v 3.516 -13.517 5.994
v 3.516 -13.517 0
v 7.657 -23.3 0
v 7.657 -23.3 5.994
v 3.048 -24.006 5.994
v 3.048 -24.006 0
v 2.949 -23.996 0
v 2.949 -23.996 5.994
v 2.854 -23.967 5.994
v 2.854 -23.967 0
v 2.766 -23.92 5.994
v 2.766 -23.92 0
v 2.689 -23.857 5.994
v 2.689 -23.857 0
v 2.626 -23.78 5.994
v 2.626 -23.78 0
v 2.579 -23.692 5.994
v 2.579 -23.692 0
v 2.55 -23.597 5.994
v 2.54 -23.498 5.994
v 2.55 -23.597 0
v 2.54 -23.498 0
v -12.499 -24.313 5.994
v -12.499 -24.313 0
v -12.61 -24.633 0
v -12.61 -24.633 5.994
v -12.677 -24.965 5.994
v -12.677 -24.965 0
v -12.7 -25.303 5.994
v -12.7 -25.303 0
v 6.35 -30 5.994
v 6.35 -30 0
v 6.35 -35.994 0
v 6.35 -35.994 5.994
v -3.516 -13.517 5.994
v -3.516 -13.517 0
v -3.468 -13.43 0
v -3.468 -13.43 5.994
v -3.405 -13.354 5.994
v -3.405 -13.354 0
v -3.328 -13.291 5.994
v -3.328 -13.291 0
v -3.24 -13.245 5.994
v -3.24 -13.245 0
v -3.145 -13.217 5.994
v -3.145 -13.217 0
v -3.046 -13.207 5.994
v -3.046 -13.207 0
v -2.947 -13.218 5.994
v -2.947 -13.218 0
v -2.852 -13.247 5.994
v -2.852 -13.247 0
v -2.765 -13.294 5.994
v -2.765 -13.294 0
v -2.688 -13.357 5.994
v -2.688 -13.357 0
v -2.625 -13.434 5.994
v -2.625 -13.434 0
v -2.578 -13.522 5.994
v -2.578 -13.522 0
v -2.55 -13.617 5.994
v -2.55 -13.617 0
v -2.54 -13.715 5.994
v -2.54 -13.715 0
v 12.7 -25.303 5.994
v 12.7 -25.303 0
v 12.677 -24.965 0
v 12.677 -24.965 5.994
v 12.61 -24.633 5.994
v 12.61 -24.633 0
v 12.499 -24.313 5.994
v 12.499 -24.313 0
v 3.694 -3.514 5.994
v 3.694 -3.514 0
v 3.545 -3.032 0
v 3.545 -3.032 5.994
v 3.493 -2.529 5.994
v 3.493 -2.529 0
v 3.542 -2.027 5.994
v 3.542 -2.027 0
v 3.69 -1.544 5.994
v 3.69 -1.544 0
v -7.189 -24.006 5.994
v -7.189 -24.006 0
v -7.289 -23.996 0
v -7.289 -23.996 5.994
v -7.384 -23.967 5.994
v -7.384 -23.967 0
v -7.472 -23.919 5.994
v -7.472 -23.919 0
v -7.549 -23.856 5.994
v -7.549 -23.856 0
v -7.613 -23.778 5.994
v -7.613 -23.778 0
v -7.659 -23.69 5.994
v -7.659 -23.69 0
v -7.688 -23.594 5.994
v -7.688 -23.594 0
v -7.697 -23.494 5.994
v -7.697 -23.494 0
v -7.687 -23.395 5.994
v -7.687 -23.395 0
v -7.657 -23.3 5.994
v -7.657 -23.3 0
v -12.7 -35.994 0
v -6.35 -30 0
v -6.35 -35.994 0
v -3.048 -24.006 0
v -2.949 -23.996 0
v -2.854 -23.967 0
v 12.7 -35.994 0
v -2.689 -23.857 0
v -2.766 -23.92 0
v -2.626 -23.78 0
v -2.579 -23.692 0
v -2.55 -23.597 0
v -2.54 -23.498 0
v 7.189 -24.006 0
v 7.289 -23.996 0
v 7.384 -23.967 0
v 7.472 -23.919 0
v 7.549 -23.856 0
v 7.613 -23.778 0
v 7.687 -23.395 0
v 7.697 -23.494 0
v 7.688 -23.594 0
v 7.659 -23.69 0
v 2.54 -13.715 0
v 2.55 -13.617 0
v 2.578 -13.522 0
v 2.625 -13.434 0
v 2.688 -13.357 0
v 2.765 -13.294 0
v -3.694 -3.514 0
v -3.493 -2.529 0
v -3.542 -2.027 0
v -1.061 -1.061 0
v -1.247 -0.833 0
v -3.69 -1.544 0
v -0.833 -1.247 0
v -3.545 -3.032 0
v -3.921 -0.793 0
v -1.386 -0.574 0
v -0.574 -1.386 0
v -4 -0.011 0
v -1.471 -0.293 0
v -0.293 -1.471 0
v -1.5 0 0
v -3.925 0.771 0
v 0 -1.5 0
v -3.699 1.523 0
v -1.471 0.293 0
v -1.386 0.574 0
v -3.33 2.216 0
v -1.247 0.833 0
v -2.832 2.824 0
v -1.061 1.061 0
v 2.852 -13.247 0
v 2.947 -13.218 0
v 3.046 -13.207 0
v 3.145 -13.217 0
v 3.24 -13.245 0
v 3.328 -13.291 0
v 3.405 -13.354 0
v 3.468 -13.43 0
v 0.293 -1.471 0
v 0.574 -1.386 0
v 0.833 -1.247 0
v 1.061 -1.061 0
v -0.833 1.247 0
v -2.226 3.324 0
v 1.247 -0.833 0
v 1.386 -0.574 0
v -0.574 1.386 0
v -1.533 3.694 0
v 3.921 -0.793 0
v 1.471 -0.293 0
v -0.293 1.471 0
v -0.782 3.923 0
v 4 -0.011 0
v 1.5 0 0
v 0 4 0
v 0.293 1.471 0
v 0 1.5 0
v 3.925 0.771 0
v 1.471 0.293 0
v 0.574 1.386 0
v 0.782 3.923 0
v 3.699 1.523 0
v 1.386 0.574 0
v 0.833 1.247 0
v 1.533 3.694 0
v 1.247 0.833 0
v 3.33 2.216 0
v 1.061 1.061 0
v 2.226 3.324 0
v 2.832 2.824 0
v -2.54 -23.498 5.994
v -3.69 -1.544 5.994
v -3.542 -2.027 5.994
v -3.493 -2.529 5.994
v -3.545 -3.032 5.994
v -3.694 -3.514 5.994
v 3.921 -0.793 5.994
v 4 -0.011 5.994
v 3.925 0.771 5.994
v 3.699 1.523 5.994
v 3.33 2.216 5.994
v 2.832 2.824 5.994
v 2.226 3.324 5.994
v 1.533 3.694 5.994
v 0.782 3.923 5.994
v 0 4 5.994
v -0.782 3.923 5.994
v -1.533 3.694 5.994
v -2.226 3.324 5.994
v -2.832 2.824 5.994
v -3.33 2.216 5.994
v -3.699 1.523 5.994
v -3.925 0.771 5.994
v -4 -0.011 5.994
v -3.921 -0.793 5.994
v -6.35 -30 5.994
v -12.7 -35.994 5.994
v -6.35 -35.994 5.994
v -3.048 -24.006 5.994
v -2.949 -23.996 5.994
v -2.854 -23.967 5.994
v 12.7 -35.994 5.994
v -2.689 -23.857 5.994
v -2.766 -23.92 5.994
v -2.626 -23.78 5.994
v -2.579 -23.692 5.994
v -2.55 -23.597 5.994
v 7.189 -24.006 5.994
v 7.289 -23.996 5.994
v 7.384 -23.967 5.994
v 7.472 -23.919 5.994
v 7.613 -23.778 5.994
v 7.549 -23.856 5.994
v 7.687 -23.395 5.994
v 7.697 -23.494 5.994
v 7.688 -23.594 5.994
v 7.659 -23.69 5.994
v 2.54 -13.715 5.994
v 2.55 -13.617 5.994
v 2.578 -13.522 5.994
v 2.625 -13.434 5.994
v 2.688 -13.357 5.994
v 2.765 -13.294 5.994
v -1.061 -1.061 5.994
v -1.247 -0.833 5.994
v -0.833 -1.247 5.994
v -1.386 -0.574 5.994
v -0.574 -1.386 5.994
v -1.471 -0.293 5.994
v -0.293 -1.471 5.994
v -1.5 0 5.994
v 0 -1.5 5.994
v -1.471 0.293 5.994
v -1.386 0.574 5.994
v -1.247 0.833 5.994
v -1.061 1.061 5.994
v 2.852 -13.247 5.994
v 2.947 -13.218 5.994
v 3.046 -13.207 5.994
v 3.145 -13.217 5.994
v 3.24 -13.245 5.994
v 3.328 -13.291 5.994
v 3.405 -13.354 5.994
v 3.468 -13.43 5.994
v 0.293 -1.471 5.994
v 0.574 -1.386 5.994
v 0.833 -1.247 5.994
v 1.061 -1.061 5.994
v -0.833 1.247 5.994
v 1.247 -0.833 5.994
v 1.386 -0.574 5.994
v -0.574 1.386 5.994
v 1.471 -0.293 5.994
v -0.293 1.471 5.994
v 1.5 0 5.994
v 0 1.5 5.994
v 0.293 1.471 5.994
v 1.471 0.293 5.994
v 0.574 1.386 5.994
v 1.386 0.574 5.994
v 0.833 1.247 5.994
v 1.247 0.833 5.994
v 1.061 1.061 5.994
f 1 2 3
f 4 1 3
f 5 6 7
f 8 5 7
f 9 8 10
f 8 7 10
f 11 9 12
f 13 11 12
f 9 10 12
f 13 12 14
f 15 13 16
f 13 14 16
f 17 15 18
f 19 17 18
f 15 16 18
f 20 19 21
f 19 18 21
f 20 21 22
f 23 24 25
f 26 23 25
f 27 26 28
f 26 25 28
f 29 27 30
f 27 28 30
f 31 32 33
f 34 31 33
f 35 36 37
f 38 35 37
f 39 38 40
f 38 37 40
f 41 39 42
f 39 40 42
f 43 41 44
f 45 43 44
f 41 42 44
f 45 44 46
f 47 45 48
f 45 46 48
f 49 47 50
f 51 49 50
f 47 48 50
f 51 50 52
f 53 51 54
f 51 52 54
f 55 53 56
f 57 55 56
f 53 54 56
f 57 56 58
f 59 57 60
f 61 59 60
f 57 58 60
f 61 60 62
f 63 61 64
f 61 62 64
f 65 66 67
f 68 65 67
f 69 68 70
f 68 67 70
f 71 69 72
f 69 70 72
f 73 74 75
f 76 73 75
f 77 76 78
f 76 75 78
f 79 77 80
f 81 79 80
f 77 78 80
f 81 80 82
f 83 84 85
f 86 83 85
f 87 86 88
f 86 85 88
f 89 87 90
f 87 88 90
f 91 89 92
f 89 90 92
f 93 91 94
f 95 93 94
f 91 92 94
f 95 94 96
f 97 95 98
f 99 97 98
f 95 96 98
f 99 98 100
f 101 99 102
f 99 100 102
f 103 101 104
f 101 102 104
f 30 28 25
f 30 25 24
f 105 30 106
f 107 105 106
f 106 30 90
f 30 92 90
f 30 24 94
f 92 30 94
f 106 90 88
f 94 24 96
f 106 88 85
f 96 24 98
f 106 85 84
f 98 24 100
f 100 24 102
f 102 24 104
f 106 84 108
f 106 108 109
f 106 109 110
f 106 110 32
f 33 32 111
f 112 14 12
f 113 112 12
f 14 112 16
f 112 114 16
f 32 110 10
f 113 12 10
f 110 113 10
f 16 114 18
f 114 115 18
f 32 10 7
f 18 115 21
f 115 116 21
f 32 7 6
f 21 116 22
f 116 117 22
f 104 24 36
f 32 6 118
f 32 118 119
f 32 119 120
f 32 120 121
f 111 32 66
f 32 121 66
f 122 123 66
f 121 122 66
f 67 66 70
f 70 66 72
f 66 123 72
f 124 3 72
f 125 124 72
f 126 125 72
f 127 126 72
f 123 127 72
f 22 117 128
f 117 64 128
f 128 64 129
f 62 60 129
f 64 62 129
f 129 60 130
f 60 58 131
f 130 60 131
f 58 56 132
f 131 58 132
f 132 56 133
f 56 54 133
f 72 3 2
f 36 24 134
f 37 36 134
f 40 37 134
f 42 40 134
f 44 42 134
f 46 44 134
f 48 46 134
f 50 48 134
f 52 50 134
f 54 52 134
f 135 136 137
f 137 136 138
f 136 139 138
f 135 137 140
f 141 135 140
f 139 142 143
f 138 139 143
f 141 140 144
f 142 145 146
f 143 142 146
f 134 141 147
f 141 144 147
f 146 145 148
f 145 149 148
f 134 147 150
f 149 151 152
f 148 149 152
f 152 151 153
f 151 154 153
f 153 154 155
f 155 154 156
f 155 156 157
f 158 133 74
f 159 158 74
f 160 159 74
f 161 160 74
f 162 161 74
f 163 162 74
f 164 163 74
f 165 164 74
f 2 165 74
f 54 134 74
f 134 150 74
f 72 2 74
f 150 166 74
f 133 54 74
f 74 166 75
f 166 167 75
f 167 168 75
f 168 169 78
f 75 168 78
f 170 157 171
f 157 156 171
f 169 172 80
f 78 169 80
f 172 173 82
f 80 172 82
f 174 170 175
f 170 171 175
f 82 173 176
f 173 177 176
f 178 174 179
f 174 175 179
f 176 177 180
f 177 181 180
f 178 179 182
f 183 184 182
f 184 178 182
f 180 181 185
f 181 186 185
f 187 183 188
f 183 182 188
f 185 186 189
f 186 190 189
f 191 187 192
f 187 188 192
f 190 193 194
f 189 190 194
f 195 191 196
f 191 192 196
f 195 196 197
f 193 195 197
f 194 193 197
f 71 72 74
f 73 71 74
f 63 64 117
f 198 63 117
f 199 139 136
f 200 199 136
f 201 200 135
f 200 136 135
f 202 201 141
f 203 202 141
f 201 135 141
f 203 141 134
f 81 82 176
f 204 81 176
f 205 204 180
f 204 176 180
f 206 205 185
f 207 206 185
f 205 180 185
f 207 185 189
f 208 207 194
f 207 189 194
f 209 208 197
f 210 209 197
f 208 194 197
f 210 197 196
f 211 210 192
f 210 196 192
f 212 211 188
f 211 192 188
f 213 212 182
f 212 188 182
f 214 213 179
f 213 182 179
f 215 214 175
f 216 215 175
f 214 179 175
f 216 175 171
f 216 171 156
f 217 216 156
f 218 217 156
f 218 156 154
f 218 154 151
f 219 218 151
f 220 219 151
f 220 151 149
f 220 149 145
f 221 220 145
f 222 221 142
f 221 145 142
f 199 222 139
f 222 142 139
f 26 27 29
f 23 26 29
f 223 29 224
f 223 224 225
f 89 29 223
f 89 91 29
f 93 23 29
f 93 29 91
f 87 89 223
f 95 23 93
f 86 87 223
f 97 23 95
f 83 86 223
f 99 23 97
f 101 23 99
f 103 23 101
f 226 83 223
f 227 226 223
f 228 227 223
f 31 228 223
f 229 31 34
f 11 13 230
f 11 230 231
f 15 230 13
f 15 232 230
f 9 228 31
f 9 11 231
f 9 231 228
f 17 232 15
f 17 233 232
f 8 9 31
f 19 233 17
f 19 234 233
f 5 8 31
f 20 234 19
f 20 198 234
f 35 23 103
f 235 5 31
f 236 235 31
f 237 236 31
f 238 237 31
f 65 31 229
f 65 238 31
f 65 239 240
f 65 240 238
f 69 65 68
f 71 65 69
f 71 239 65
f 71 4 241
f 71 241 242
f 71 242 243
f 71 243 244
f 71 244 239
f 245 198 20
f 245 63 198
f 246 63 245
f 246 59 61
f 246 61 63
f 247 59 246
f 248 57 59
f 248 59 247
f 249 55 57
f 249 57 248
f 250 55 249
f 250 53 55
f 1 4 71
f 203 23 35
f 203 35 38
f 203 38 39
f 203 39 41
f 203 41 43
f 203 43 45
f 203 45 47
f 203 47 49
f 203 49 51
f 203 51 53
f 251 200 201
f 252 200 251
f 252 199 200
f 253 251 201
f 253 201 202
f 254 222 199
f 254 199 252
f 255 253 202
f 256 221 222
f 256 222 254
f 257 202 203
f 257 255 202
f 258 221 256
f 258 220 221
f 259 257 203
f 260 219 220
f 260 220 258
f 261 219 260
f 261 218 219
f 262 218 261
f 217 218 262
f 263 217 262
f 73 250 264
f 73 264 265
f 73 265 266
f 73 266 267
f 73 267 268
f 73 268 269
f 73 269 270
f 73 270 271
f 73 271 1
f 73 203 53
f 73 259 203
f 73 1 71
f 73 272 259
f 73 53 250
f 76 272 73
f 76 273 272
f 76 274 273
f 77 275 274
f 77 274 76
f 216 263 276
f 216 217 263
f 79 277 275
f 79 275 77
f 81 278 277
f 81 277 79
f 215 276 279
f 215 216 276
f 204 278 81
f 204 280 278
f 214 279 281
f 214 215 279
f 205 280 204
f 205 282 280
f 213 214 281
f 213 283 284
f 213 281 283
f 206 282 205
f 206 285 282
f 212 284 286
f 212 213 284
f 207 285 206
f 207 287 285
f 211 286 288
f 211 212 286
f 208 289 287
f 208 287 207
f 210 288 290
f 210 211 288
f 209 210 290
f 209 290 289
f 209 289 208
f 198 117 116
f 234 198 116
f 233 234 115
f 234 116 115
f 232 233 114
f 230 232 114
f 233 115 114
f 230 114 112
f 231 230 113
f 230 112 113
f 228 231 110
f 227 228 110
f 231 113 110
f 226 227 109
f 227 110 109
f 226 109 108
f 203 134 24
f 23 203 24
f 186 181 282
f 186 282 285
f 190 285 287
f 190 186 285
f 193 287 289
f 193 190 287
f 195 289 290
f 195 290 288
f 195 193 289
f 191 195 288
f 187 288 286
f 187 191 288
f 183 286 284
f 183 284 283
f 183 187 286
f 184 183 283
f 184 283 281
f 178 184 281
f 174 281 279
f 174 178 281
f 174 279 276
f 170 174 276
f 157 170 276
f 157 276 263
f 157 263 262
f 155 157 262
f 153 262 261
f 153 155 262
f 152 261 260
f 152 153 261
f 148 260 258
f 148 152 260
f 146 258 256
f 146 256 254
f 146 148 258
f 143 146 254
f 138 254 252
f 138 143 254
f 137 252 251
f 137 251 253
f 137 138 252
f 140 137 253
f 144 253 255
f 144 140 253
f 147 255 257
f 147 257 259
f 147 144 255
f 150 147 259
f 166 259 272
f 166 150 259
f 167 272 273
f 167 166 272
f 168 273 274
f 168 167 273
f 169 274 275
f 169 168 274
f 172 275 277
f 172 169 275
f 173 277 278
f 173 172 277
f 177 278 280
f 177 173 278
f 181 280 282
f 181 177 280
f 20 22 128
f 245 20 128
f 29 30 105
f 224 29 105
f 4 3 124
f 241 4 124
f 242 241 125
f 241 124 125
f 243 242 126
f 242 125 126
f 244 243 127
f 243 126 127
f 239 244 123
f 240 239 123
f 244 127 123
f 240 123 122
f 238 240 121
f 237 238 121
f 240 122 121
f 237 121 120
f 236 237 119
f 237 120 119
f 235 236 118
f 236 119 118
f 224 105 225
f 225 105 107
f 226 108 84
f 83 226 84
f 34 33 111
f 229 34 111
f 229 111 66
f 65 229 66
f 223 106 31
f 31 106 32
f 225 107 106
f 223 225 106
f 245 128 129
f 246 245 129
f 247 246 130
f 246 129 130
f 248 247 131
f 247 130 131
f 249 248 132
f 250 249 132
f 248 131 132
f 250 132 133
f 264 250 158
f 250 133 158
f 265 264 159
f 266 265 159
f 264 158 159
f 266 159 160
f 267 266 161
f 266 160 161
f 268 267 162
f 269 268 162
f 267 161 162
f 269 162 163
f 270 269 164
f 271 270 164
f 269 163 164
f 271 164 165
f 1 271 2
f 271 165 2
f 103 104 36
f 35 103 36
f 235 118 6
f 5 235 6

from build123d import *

# Parameters (mm, degrees)
SKETCH1_R           = 1.5
BOSS_EXTRUDE1_DEPTH = 5.9944


with BuildPart() as part:
    # Sketch1 → Boss-Extrude1 (new body)
    with BuildSketch(Plane.XY):
        with BuildLine():
            Line((-12.7, -25.303097847), (-12.7, -30))
            Line((-12.7, -30), (-12.7, -35.9944))
            Line((-12.7, -35.9944), (-6.35, -35.9944))
            Line((-6.35, -35.9944), (-6.35, -30))
            Line((-6.35, -30), (6.35, -30))
            Line((6.35, -30), (6.35, -35.9944))
            Line((6.35, -35.9944), (12.7, -35.9944))
            Line((12.7, -35.9944), (12.7, -30))
            Line((12.7, -30), (12.7, -25.303097847))
            ThreePointArc((12.7, -25.303097847), (12.649253454, -24.797907547), (12.499041543, -24.312903594))
            Line((12.499041543, -24.312903594), (3.694269669, -3.514229875))
            ThreePointArc((3.694269669, -3.514229875), (3.493316902, -2.529412233), (3.690098601, -1.543752674))
            ThreePointArc((3.690098601, -1.543752674), (0, 4), (-3.690098601, -1.543752674))
            ThreePointArc((-3.690098601, -1.543752674), (-3.493316902, -2.529412233), (-3.694269669, -3.514229875))
            Line((-3.694269669, -3.514229875), (-12.499041543, -24.312903594))
            ThreePointArc((-12.499041543, -24.312903594), (-12.649253454, -24.797907547), (-12.7, -25.303097847))
        make_face()
        with BuildLine():
            ThreePointArc((-2.54, -23.4976), (-2.688789755, -23.856810245), (-3.048, -24.0056))
            Line((-3.048, -24.0056), (-7.189093556, -24.0056))
            ThreePointArc((-7.189093556, -24.0056), (-7.612571853, -23.778188902), (-7.656901865, -23.299561149))
            Line((-7.656901865, -23.299561149), (-3.515808309, -13.517450387))
            ThreePointArc((-3.515808309, -13.517450387), (-2.94696194, -13.217638546), (-2.54, -13.715489237))
            Line((-2.54, -13.715489237), (-2.54, -23.4976))
        make_face(mode=Mode.SUBTRACT)
        with BuildLine():
            ThreePointArc((7.656901865, -23.299561149), (7.612571853, -23.778188902), (7.189093556, -24.0056))
            Line((7.189093556, -24.0056), (3.048, -24.0056))
            ThreePointArc((3.048, -24.0056), (2.688789755, -23.856810245), (2.54, -23.4976))
            Line((2.54, -23.4976), (2.54, -13.715489237))
            ThreePointArc((2.54, -13.715489237), (2.94696194, -13.217638546), (3.515808309, -13.517450387))
            Line((3.515808309, -13.517450387), (7.656901865, -23.299561149))
        make_face(mode=Mode.SUBTRACT)
        Circle(SKETCH1_R, mode=Mode.SUBTRACT)
    extrude(amount=BOSS_EXTRUDE1_DEPTH)


solid = part.part
